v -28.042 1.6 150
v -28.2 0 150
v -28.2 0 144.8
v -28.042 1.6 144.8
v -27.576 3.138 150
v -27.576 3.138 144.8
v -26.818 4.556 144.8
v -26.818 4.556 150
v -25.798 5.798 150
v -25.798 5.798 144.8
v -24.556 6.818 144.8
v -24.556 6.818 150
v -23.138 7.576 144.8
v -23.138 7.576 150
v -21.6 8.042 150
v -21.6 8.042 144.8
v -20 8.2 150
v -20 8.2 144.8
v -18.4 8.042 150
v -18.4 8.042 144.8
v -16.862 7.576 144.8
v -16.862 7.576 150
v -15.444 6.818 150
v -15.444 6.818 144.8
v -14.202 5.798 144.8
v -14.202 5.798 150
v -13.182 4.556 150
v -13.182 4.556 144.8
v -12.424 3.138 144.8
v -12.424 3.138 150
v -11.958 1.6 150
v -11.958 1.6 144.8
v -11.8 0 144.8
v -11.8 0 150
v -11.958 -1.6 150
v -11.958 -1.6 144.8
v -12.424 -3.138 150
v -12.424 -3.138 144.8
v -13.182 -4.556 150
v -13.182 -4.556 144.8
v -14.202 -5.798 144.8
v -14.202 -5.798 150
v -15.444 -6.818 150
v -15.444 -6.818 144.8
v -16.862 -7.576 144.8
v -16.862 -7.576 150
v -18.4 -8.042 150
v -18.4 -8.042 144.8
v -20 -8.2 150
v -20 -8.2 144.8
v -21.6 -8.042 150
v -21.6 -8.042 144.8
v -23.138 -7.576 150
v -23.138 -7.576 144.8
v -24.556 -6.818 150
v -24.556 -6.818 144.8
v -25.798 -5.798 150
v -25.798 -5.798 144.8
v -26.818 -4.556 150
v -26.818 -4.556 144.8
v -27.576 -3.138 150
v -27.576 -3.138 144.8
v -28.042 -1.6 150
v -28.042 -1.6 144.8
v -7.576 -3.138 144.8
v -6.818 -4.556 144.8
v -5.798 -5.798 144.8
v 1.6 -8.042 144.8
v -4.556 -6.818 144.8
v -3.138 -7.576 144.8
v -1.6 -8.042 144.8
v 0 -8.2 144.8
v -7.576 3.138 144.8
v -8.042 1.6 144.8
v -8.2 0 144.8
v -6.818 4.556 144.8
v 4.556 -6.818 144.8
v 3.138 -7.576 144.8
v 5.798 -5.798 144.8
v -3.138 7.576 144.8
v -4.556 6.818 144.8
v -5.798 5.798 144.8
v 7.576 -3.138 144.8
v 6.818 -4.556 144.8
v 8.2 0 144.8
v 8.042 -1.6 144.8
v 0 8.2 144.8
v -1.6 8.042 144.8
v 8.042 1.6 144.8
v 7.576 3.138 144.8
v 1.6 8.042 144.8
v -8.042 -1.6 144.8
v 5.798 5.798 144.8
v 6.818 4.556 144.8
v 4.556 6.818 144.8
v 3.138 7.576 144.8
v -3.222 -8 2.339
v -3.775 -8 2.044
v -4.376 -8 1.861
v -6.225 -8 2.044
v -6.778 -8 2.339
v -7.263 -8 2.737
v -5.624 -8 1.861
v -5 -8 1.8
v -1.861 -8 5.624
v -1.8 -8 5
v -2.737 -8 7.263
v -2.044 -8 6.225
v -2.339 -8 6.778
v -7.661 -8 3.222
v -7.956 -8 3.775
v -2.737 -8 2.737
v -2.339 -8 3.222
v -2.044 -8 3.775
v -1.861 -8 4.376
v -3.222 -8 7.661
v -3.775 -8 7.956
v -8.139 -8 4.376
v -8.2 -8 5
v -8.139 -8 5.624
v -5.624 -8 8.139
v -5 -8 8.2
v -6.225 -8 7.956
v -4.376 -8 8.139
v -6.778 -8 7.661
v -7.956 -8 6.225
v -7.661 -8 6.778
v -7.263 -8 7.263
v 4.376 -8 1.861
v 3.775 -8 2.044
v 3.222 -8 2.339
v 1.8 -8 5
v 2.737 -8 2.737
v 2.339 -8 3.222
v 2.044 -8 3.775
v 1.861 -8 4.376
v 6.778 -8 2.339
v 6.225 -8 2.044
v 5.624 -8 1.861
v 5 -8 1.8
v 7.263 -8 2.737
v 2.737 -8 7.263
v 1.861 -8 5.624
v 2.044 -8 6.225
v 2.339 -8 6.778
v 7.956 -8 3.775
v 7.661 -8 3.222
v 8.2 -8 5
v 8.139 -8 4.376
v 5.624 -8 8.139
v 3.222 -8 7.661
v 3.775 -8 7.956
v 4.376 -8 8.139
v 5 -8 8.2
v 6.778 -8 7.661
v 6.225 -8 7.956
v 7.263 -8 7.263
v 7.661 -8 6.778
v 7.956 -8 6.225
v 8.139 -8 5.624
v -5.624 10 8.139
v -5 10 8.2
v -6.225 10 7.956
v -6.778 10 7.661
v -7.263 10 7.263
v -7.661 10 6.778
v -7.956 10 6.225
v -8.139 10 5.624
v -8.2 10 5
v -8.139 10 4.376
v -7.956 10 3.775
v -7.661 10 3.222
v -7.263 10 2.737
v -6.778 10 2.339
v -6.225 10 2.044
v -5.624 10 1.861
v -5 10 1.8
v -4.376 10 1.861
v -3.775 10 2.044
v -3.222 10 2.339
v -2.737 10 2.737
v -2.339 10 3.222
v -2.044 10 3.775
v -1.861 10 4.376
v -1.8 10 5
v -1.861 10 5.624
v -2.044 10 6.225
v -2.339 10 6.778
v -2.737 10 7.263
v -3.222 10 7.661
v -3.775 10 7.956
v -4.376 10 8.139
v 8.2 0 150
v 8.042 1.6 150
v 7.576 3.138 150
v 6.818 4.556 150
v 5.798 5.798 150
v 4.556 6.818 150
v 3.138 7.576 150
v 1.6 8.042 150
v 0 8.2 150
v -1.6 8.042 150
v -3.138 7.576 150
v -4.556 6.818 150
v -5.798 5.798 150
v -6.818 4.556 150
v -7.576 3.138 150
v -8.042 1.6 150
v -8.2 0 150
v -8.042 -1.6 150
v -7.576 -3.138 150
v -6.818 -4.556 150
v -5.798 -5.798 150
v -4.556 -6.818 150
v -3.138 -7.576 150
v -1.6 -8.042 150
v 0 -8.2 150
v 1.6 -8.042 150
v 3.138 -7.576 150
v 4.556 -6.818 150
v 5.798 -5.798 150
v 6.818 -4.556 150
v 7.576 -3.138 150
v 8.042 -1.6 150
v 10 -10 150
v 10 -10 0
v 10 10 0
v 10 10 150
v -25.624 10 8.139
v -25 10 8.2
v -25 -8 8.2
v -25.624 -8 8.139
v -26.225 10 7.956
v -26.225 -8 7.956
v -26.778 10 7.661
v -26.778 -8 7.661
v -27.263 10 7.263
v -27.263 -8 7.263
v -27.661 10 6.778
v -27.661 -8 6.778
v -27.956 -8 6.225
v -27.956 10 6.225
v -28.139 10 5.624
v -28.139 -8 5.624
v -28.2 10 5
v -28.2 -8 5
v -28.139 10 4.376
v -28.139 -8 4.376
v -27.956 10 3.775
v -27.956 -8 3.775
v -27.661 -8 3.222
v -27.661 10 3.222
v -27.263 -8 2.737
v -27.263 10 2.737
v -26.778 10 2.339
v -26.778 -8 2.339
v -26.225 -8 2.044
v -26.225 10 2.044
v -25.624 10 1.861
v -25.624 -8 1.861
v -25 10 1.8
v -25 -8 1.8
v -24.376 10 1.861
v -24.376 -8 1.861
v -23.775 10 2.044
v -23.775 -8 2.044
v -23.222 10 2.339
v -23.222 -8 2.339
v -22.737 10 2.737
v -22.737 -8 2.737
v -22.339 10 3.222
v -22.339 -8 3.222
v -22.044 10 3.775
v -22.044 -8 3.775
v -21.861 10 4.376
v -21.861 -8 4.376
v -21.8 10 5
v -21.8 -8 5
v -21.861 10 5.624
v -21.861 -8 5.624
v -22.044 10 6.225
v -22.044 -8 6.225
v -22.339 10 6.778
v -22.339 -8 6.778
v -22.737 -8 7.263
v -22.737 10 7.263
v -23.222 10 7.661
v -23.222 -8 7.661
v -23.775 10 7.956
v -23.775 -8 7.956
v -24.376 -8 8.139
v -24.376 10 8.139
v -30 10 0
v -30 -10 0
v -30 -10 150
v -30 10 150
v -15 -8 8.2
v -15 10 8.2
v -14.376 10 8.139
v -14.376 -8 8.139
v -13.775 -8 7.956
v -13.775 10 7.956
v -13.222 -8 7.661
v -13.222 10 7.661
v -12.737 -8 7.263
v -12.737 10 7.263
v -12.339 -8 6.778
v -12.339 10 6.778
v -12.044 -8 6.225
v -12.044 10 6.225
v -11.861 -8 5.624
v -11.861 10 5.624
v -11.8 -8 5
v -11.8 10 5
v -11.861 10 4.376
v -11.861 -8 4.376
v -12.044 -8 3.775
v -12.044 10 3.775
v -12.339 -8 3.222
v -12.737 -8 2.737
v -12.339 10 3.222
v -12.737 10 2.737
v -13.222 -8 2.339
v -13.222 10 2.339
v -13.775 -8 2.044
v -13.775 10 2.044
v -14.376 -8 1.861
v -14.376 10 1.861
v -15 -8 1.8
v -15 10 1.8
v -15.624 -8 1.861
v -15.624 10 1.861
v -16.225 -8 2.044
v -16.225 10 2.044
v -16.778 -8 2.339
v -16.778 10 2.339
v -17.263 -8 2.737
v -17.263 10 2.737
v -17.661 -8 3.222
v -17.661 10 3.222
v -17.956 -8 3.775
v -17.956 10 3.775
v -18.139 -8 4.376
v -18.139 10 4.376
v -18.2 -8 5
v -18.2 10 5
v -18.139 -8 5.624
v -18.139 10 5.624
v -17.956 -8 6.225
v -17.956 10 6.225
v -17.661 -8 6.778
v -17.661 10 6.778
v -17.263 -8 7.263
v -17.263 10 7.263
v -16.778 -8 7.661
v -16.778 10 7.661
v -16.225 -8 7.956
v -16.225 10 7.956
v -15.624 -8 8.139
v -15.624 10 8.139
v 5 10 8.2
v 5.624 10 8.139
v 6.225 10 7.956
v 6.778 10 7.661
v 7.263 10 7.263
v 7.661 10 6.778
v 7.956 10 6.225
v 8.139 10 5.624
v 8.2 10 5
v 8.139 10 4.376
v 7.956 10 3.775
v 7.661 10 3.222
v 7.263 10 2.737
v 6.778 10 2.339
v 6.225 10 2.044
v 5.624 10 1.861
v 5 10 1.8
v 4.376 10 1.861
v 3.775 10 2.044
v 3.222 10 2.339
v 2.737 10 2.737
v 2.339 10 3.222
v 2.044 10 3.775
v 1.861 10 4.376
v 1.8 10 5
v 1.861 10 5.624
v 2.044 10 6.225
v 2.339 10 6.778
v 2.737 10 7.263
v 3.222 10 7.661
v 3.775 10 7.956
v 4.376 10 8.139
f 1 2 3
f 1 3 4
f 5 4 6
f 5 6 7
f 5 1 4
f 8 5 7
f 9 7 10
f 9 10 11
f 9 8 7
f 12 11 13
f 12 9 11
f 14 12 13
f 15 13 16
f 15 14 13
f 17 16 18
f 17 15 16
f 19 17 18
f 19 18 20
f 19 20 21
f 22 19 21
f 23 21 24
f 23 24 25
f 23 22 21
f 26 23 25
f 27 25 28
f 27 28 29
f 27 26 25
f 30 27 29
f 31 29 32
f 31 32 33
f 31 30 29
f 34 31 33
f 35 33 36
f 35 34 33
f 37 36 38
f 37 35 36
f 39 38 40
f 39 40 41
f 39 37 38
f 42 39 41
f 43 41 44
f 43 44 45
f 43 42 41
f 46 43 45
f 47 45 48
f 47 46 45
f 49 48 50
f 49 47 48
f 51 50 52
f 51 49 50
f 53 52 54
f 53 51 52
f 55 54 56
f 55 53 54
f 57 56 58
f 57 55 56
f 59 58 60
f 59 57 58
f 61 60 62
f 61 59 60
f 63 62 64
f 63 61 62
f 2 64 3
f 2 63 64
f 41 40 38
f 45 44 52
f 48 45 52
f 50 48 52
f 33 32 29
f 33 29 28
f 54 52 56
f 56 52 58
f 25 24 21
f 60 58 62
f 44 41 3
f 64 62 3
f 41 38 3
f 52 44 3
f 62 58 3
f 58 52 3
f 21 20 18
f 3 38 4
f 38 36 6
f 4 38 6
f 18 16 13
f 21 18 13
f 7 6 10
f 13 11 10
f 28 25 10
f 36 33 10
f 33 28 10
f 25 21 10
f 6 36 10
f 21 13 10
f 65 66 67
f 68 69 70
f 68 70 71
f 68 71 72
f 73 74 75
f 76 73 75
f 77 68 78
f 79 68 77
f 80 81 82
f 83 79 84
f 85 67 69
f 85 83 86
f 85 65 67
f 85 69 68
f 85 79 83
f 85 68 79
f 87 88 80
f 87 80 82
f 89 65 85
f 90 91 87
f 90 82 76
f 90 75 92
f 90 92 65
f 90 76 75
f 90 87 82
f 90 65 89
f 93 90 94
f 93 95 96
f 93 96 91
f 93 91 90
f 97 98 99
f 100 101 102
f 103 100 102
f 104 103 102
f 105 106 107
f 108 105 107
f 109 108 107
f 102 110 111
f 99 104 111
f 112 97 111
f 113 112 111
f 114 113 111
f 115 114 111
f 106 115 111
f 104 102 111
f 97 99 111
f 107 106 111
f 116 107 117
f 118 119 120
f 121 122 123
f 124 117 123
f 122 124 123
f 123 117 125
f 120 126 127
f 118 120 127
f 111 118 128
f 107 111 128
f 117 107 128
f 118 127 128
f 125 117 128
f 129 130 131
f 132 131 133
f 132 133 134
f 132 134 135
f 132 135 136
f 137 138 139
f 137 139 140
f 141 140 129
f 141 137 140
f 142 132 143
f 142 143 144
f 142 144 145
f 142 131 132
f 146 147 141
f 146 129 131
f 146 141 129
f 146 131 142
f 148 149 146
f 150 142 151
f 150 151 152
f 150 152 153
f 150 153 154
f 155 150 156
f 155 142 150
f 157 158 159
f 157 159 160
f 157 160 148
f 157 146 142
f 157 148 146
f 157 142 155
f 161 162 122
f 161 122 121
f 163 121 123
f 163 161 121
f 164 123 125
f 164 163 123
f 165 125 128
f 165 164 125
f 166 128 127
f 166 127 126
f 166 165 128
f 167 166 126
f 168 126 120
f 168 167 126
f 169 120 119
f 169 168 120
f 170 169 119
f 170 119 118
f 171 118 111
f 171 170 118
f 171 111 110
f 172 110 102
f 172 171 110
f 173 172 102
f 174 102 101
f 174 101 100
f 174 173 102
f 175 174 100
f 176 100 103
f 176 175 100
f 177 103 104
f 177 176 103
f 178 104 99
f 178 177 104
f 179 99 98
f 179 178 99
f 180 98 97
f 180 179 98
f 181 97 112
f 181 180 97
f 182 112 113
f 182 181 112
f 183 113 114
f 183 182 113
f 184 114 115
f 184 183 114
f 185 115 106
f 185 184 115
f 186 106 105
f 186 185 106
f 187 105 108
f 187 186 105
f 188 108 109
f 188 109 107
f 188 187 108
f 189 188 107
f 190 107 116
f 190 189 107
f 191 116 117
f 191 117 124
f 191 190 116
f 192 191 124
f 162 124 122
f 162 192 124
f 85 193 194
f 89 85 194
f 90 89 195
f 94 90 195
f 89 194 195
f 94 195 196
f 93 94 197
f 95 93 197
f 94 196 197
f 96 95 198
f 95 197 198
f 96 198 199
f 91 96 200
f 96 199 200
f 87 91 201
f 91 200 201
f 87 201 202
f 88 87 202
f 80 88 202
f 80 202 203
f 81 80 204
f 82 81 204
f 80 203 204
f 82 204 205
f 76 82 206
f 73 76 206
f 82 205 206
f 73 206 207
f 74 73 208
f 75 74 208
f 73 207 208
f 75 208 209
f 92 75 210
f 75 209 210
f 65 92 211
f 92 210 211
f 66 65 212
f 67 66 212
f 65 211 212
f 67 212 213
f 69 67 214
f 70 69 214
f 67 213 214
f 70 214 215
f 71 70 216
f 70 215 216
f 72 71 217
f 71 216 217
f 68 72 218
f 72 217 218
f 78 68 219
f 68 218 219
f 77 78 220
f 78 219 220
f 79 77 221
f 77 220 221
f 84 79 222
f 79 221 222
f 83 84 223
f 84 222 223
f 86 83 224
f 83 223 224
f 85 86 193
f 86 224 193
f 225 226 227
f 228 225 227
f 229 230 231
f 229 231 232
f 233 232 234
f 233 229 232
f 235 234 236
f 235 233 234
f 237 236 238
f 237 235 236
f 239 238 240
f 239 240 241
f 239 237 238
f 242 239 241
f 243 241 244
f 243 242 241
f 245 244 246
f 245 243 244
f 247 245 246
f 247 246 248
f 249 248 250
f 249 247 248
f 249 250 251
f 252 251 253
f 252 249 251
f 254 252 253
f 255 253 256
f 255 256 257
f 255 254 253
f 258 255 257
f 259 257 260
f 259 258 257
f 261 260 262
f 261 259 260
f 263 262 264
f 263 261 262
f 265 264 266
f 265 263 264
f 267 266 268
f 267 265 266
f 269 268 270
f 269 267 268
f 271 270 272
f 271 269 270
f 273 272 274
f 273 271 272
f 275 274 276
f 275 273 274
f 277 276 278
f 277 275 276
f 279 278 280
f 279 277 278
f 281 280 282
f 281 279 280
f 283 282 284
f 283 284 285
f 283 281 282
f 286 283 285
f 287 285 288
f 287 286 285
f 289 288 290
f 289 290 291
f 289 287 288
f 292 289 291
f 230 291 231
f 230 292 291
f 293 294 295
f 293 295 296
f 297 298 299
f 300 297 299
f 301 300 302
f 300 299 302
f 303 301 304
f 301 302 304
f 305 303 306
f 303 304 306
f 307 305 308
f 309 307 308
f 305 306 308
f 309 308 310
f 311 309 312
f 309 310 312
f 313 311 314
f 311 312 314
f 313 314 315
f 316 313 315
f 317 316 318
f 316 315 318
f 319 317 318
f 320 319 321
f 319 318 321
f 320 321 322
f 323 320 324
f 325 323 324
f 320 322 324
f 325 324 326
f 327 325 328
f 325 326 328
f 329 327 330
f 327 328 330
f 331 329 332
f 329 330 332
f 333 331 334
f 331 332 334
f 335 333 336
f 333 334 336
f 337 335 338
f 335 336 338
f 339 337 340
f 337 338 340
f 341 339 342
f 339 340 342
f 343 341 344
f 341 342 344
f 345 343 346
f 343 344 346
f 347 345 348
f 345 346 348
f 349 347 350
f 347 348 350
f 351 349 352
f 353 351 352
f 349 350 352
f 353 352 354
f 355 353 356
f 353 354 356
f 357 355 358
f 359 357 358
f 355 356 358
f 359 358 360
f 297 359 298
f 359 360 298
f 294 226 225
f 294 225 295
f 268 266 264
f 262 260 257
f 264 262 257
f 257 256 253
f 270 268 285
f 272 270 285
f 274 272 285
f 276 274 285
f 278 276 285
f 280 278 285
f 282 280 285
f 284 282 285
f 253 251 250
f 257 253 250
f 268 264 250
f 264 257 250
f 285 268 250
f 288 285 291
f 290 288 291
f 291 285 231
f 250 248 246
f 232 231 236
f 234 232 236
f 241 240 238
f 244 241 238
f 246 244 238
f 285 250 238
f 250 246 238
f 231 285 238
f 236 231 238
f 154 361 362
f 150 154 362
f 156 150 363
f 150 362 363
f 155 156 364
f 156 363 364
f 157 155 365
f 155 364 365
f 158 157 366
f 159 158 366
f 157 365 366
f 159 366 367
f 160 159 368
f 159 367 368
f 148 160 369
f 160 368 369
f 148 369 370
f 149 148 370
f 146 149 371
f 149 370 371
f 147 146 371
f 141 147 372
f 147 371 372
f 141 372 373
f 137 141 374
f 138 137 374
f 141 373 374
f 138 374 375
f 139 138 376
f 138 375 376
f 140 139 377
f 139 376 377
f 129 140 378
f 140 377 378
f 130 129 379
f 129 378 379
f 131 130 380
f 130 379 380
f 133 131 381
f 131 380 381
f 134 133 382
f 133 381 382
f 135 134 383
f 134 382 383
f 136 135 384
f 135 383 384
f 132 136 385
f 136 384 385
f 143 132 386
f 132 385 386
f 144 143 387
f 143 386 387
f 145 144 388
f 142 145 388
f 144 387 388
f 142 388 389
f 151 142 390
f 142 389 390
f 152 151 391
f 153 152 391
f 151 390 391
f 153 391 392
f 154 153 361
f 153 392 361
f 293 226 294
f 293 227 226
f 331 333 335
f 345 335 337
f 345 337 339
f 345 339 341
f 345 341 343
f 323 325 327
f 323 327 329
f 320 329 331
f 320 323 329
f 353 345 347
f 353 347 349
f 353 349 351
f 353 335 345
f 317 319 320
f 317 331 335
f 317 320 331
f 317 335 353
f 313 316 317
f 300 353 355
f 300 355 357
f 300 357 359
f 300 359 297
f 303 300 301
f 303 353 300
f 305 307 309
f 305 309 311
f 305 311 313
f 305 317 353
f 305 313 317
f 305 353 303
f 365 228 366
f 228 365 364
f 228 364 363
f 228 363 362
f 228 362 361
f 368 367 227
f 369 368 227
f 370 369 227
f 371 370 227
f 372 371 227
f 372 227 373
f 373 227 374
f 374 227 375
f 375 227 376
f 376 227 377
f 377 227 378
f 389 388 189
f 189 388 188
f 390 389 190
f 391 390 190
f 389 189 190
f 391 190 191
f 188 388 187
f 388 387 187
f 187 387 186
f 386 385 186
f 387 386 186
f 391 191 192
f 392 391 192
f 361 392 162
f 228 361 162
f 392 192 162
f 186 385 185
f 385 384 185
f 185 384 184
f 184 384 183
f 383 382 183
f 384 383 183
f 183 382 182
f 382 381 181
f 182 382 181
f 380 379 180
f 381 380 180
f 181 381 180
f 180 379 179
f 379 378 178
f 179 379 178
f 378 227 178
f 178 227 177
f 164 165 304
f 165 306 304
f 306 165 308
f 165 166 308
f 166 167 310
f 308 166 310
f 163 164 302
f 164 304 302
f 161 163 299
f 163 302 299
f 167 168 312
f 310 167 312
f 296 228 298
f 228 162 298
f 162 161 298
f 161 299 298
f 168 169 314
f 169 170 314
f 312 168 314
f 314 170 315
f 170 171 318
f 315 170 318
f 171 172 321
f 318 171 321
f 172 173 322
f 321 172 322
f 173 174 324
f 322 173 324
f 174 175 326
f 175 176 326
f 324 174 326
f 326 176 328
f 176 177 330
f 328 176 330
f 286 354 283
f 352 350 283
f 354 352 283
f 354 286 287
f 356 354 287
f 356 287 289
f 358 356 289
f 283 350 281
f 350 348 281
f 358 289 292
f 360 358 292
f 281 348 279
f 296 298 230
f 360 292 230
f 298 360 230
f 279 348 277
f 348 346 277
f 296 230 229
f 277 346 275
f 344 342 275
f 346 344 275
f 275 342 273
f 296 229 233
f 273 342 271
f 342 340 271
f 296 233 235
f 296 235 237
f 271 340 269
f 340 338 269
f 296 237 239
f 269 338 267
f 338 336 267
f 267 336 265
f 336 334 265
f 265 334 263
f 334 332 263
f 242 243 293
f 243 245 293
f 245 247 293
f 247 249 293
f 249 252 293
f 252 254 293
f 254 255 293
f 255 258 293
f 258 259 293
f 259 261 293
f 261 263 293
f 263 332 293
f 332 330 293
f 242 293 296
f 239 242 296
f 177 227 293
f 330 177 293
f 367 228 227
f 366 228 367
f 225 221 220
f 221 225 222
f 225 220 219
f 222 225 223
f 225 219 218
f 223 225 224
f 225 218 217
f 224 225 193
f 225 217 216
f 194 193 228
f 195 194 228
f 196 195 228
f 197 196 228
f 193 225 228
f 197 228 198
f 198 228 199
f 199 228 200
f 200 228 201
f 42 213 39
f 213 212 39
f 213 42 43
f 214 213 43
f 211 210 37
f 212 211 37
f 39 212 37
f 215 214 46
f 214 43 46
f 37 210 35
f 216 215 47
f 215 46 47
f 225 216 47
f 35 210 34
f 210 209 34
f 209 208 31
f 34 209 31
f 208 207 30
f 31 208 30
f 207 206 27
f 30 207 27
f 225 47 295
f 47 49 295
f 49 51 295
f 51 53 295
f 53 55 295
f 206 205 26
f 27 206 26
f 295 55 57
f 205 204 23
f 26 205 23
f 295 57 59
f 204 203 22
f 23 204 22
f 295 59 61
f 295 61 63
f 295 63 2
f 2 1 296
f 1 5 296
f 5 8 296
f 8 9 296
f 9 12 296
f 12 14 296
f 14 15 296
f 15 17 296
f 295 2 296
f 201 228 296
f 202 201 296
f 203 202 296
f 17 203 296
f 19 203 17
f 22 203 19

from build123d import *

# Parameters (mm, degrees)
SKETCH_1_W               = 20
SKETCH_1_H               = 20
EXTRUDE_1_DEPTH          = 150
SKETCH_2_R               = 8.2
CUT_EXTRUDE_1_DEPTH      = 5.2
SKETCH_3_R               = 3.2
CUT_EXTRUDE_2_DEPTH      = 18
MIRROR_2_COPY_1_SKETCH_R = 3.2
MIRROR_2_COPY_1_DEPTH    = 18


with BuildPart() as part:
    # ｽｹｯﾁ1 → ﾎﾞｽ - 押し出し1 (new body)
    with BuildSketch(Plane.XY):
        Rectangle(SKETCH_1_W, SKETCH_1_H)
    extrude_1 = extrude(amount=EXTRUDE_1_DEPTH)

    # ｽｹｯﾁ2 → ｶｯﾄ - 押し出し1 (cut)
    with BuildSketch(Plane.XY.offset(150)):
        Circle(SKETCH_2_R)
    cut_extrude_1 = extrude(amount=-CUT_EXTRUDE_1_DEPTH, mode=Mode.SUBTRACT)

    # ｽｹｯﾁ3 → ｶｯﾄ - 押し出し2 (cut)
    with BuildSketch(Plane(origin=(0, 10, 0), x_dir=(1, 0, 0), z_dir=(0, 1, 0))):
        with Locations(Location((5, -5, 0), (0, 0, 270))):
            Circle(SKETCH_3_R)
    cut_extrude_2 = extrude(amount=-CUT_EXTRUDE_2_DEPTH, mode=Mode.SUBTRACT)

    # ﾐﾗｰ1: ｶｯﾄ - 押し出し2 across plane
    add(cut_extrude_2.mirror(Plane(origin=(0, 0, 0), x_dir=(0, 0, 1), z_dir=(1, 0, 0))), mode=Mode.SUBTRACT)

    # ﾐﾗｰ2: ﾎﾞｽ - 押し出し1, ｶｯﾄ - 押し出し1, ｶｯﾄ - 押し出し2 across plane
    add(extrude_1.mirror(Plane(origin=(-10, 10, 150), x_dir=(0, 0, 1), z_dir=(1, 0, 0))))
    add(cut_extrude_1.mirror(Plane(origin=(-10, 10, 150), x_dir=(0, 0, 1), z_dir=(1, 0, 0))), mode=Mode.SUBTRACT)
    add(cut_extrude_2.mirror(Plane(origin=(-10, 10, 150), x_dir=(0, 0, 1), z_dir=(1, 0, 0))), mode=Mode.SUBTRACT)

    # ﾐﾗｰ2 copy 1 sketch → ﾐﾗｰ2 copy 1 (cut)
    with BuildSketch(Plane(origin=(-20, 10, 0), x_dir=(1, 0, 0), z_dir=(0, 1, 0))):
        with Locations(Location((5, -5, 0), (0, 0, 270))):
            Circle(MIRROR_2_COPY_1_SKETCH_R)
    extrude(amount=-MIRROR_2_COPY_1_DEPTH, mode=Mode.SUBTRACT)


solid = part.part
